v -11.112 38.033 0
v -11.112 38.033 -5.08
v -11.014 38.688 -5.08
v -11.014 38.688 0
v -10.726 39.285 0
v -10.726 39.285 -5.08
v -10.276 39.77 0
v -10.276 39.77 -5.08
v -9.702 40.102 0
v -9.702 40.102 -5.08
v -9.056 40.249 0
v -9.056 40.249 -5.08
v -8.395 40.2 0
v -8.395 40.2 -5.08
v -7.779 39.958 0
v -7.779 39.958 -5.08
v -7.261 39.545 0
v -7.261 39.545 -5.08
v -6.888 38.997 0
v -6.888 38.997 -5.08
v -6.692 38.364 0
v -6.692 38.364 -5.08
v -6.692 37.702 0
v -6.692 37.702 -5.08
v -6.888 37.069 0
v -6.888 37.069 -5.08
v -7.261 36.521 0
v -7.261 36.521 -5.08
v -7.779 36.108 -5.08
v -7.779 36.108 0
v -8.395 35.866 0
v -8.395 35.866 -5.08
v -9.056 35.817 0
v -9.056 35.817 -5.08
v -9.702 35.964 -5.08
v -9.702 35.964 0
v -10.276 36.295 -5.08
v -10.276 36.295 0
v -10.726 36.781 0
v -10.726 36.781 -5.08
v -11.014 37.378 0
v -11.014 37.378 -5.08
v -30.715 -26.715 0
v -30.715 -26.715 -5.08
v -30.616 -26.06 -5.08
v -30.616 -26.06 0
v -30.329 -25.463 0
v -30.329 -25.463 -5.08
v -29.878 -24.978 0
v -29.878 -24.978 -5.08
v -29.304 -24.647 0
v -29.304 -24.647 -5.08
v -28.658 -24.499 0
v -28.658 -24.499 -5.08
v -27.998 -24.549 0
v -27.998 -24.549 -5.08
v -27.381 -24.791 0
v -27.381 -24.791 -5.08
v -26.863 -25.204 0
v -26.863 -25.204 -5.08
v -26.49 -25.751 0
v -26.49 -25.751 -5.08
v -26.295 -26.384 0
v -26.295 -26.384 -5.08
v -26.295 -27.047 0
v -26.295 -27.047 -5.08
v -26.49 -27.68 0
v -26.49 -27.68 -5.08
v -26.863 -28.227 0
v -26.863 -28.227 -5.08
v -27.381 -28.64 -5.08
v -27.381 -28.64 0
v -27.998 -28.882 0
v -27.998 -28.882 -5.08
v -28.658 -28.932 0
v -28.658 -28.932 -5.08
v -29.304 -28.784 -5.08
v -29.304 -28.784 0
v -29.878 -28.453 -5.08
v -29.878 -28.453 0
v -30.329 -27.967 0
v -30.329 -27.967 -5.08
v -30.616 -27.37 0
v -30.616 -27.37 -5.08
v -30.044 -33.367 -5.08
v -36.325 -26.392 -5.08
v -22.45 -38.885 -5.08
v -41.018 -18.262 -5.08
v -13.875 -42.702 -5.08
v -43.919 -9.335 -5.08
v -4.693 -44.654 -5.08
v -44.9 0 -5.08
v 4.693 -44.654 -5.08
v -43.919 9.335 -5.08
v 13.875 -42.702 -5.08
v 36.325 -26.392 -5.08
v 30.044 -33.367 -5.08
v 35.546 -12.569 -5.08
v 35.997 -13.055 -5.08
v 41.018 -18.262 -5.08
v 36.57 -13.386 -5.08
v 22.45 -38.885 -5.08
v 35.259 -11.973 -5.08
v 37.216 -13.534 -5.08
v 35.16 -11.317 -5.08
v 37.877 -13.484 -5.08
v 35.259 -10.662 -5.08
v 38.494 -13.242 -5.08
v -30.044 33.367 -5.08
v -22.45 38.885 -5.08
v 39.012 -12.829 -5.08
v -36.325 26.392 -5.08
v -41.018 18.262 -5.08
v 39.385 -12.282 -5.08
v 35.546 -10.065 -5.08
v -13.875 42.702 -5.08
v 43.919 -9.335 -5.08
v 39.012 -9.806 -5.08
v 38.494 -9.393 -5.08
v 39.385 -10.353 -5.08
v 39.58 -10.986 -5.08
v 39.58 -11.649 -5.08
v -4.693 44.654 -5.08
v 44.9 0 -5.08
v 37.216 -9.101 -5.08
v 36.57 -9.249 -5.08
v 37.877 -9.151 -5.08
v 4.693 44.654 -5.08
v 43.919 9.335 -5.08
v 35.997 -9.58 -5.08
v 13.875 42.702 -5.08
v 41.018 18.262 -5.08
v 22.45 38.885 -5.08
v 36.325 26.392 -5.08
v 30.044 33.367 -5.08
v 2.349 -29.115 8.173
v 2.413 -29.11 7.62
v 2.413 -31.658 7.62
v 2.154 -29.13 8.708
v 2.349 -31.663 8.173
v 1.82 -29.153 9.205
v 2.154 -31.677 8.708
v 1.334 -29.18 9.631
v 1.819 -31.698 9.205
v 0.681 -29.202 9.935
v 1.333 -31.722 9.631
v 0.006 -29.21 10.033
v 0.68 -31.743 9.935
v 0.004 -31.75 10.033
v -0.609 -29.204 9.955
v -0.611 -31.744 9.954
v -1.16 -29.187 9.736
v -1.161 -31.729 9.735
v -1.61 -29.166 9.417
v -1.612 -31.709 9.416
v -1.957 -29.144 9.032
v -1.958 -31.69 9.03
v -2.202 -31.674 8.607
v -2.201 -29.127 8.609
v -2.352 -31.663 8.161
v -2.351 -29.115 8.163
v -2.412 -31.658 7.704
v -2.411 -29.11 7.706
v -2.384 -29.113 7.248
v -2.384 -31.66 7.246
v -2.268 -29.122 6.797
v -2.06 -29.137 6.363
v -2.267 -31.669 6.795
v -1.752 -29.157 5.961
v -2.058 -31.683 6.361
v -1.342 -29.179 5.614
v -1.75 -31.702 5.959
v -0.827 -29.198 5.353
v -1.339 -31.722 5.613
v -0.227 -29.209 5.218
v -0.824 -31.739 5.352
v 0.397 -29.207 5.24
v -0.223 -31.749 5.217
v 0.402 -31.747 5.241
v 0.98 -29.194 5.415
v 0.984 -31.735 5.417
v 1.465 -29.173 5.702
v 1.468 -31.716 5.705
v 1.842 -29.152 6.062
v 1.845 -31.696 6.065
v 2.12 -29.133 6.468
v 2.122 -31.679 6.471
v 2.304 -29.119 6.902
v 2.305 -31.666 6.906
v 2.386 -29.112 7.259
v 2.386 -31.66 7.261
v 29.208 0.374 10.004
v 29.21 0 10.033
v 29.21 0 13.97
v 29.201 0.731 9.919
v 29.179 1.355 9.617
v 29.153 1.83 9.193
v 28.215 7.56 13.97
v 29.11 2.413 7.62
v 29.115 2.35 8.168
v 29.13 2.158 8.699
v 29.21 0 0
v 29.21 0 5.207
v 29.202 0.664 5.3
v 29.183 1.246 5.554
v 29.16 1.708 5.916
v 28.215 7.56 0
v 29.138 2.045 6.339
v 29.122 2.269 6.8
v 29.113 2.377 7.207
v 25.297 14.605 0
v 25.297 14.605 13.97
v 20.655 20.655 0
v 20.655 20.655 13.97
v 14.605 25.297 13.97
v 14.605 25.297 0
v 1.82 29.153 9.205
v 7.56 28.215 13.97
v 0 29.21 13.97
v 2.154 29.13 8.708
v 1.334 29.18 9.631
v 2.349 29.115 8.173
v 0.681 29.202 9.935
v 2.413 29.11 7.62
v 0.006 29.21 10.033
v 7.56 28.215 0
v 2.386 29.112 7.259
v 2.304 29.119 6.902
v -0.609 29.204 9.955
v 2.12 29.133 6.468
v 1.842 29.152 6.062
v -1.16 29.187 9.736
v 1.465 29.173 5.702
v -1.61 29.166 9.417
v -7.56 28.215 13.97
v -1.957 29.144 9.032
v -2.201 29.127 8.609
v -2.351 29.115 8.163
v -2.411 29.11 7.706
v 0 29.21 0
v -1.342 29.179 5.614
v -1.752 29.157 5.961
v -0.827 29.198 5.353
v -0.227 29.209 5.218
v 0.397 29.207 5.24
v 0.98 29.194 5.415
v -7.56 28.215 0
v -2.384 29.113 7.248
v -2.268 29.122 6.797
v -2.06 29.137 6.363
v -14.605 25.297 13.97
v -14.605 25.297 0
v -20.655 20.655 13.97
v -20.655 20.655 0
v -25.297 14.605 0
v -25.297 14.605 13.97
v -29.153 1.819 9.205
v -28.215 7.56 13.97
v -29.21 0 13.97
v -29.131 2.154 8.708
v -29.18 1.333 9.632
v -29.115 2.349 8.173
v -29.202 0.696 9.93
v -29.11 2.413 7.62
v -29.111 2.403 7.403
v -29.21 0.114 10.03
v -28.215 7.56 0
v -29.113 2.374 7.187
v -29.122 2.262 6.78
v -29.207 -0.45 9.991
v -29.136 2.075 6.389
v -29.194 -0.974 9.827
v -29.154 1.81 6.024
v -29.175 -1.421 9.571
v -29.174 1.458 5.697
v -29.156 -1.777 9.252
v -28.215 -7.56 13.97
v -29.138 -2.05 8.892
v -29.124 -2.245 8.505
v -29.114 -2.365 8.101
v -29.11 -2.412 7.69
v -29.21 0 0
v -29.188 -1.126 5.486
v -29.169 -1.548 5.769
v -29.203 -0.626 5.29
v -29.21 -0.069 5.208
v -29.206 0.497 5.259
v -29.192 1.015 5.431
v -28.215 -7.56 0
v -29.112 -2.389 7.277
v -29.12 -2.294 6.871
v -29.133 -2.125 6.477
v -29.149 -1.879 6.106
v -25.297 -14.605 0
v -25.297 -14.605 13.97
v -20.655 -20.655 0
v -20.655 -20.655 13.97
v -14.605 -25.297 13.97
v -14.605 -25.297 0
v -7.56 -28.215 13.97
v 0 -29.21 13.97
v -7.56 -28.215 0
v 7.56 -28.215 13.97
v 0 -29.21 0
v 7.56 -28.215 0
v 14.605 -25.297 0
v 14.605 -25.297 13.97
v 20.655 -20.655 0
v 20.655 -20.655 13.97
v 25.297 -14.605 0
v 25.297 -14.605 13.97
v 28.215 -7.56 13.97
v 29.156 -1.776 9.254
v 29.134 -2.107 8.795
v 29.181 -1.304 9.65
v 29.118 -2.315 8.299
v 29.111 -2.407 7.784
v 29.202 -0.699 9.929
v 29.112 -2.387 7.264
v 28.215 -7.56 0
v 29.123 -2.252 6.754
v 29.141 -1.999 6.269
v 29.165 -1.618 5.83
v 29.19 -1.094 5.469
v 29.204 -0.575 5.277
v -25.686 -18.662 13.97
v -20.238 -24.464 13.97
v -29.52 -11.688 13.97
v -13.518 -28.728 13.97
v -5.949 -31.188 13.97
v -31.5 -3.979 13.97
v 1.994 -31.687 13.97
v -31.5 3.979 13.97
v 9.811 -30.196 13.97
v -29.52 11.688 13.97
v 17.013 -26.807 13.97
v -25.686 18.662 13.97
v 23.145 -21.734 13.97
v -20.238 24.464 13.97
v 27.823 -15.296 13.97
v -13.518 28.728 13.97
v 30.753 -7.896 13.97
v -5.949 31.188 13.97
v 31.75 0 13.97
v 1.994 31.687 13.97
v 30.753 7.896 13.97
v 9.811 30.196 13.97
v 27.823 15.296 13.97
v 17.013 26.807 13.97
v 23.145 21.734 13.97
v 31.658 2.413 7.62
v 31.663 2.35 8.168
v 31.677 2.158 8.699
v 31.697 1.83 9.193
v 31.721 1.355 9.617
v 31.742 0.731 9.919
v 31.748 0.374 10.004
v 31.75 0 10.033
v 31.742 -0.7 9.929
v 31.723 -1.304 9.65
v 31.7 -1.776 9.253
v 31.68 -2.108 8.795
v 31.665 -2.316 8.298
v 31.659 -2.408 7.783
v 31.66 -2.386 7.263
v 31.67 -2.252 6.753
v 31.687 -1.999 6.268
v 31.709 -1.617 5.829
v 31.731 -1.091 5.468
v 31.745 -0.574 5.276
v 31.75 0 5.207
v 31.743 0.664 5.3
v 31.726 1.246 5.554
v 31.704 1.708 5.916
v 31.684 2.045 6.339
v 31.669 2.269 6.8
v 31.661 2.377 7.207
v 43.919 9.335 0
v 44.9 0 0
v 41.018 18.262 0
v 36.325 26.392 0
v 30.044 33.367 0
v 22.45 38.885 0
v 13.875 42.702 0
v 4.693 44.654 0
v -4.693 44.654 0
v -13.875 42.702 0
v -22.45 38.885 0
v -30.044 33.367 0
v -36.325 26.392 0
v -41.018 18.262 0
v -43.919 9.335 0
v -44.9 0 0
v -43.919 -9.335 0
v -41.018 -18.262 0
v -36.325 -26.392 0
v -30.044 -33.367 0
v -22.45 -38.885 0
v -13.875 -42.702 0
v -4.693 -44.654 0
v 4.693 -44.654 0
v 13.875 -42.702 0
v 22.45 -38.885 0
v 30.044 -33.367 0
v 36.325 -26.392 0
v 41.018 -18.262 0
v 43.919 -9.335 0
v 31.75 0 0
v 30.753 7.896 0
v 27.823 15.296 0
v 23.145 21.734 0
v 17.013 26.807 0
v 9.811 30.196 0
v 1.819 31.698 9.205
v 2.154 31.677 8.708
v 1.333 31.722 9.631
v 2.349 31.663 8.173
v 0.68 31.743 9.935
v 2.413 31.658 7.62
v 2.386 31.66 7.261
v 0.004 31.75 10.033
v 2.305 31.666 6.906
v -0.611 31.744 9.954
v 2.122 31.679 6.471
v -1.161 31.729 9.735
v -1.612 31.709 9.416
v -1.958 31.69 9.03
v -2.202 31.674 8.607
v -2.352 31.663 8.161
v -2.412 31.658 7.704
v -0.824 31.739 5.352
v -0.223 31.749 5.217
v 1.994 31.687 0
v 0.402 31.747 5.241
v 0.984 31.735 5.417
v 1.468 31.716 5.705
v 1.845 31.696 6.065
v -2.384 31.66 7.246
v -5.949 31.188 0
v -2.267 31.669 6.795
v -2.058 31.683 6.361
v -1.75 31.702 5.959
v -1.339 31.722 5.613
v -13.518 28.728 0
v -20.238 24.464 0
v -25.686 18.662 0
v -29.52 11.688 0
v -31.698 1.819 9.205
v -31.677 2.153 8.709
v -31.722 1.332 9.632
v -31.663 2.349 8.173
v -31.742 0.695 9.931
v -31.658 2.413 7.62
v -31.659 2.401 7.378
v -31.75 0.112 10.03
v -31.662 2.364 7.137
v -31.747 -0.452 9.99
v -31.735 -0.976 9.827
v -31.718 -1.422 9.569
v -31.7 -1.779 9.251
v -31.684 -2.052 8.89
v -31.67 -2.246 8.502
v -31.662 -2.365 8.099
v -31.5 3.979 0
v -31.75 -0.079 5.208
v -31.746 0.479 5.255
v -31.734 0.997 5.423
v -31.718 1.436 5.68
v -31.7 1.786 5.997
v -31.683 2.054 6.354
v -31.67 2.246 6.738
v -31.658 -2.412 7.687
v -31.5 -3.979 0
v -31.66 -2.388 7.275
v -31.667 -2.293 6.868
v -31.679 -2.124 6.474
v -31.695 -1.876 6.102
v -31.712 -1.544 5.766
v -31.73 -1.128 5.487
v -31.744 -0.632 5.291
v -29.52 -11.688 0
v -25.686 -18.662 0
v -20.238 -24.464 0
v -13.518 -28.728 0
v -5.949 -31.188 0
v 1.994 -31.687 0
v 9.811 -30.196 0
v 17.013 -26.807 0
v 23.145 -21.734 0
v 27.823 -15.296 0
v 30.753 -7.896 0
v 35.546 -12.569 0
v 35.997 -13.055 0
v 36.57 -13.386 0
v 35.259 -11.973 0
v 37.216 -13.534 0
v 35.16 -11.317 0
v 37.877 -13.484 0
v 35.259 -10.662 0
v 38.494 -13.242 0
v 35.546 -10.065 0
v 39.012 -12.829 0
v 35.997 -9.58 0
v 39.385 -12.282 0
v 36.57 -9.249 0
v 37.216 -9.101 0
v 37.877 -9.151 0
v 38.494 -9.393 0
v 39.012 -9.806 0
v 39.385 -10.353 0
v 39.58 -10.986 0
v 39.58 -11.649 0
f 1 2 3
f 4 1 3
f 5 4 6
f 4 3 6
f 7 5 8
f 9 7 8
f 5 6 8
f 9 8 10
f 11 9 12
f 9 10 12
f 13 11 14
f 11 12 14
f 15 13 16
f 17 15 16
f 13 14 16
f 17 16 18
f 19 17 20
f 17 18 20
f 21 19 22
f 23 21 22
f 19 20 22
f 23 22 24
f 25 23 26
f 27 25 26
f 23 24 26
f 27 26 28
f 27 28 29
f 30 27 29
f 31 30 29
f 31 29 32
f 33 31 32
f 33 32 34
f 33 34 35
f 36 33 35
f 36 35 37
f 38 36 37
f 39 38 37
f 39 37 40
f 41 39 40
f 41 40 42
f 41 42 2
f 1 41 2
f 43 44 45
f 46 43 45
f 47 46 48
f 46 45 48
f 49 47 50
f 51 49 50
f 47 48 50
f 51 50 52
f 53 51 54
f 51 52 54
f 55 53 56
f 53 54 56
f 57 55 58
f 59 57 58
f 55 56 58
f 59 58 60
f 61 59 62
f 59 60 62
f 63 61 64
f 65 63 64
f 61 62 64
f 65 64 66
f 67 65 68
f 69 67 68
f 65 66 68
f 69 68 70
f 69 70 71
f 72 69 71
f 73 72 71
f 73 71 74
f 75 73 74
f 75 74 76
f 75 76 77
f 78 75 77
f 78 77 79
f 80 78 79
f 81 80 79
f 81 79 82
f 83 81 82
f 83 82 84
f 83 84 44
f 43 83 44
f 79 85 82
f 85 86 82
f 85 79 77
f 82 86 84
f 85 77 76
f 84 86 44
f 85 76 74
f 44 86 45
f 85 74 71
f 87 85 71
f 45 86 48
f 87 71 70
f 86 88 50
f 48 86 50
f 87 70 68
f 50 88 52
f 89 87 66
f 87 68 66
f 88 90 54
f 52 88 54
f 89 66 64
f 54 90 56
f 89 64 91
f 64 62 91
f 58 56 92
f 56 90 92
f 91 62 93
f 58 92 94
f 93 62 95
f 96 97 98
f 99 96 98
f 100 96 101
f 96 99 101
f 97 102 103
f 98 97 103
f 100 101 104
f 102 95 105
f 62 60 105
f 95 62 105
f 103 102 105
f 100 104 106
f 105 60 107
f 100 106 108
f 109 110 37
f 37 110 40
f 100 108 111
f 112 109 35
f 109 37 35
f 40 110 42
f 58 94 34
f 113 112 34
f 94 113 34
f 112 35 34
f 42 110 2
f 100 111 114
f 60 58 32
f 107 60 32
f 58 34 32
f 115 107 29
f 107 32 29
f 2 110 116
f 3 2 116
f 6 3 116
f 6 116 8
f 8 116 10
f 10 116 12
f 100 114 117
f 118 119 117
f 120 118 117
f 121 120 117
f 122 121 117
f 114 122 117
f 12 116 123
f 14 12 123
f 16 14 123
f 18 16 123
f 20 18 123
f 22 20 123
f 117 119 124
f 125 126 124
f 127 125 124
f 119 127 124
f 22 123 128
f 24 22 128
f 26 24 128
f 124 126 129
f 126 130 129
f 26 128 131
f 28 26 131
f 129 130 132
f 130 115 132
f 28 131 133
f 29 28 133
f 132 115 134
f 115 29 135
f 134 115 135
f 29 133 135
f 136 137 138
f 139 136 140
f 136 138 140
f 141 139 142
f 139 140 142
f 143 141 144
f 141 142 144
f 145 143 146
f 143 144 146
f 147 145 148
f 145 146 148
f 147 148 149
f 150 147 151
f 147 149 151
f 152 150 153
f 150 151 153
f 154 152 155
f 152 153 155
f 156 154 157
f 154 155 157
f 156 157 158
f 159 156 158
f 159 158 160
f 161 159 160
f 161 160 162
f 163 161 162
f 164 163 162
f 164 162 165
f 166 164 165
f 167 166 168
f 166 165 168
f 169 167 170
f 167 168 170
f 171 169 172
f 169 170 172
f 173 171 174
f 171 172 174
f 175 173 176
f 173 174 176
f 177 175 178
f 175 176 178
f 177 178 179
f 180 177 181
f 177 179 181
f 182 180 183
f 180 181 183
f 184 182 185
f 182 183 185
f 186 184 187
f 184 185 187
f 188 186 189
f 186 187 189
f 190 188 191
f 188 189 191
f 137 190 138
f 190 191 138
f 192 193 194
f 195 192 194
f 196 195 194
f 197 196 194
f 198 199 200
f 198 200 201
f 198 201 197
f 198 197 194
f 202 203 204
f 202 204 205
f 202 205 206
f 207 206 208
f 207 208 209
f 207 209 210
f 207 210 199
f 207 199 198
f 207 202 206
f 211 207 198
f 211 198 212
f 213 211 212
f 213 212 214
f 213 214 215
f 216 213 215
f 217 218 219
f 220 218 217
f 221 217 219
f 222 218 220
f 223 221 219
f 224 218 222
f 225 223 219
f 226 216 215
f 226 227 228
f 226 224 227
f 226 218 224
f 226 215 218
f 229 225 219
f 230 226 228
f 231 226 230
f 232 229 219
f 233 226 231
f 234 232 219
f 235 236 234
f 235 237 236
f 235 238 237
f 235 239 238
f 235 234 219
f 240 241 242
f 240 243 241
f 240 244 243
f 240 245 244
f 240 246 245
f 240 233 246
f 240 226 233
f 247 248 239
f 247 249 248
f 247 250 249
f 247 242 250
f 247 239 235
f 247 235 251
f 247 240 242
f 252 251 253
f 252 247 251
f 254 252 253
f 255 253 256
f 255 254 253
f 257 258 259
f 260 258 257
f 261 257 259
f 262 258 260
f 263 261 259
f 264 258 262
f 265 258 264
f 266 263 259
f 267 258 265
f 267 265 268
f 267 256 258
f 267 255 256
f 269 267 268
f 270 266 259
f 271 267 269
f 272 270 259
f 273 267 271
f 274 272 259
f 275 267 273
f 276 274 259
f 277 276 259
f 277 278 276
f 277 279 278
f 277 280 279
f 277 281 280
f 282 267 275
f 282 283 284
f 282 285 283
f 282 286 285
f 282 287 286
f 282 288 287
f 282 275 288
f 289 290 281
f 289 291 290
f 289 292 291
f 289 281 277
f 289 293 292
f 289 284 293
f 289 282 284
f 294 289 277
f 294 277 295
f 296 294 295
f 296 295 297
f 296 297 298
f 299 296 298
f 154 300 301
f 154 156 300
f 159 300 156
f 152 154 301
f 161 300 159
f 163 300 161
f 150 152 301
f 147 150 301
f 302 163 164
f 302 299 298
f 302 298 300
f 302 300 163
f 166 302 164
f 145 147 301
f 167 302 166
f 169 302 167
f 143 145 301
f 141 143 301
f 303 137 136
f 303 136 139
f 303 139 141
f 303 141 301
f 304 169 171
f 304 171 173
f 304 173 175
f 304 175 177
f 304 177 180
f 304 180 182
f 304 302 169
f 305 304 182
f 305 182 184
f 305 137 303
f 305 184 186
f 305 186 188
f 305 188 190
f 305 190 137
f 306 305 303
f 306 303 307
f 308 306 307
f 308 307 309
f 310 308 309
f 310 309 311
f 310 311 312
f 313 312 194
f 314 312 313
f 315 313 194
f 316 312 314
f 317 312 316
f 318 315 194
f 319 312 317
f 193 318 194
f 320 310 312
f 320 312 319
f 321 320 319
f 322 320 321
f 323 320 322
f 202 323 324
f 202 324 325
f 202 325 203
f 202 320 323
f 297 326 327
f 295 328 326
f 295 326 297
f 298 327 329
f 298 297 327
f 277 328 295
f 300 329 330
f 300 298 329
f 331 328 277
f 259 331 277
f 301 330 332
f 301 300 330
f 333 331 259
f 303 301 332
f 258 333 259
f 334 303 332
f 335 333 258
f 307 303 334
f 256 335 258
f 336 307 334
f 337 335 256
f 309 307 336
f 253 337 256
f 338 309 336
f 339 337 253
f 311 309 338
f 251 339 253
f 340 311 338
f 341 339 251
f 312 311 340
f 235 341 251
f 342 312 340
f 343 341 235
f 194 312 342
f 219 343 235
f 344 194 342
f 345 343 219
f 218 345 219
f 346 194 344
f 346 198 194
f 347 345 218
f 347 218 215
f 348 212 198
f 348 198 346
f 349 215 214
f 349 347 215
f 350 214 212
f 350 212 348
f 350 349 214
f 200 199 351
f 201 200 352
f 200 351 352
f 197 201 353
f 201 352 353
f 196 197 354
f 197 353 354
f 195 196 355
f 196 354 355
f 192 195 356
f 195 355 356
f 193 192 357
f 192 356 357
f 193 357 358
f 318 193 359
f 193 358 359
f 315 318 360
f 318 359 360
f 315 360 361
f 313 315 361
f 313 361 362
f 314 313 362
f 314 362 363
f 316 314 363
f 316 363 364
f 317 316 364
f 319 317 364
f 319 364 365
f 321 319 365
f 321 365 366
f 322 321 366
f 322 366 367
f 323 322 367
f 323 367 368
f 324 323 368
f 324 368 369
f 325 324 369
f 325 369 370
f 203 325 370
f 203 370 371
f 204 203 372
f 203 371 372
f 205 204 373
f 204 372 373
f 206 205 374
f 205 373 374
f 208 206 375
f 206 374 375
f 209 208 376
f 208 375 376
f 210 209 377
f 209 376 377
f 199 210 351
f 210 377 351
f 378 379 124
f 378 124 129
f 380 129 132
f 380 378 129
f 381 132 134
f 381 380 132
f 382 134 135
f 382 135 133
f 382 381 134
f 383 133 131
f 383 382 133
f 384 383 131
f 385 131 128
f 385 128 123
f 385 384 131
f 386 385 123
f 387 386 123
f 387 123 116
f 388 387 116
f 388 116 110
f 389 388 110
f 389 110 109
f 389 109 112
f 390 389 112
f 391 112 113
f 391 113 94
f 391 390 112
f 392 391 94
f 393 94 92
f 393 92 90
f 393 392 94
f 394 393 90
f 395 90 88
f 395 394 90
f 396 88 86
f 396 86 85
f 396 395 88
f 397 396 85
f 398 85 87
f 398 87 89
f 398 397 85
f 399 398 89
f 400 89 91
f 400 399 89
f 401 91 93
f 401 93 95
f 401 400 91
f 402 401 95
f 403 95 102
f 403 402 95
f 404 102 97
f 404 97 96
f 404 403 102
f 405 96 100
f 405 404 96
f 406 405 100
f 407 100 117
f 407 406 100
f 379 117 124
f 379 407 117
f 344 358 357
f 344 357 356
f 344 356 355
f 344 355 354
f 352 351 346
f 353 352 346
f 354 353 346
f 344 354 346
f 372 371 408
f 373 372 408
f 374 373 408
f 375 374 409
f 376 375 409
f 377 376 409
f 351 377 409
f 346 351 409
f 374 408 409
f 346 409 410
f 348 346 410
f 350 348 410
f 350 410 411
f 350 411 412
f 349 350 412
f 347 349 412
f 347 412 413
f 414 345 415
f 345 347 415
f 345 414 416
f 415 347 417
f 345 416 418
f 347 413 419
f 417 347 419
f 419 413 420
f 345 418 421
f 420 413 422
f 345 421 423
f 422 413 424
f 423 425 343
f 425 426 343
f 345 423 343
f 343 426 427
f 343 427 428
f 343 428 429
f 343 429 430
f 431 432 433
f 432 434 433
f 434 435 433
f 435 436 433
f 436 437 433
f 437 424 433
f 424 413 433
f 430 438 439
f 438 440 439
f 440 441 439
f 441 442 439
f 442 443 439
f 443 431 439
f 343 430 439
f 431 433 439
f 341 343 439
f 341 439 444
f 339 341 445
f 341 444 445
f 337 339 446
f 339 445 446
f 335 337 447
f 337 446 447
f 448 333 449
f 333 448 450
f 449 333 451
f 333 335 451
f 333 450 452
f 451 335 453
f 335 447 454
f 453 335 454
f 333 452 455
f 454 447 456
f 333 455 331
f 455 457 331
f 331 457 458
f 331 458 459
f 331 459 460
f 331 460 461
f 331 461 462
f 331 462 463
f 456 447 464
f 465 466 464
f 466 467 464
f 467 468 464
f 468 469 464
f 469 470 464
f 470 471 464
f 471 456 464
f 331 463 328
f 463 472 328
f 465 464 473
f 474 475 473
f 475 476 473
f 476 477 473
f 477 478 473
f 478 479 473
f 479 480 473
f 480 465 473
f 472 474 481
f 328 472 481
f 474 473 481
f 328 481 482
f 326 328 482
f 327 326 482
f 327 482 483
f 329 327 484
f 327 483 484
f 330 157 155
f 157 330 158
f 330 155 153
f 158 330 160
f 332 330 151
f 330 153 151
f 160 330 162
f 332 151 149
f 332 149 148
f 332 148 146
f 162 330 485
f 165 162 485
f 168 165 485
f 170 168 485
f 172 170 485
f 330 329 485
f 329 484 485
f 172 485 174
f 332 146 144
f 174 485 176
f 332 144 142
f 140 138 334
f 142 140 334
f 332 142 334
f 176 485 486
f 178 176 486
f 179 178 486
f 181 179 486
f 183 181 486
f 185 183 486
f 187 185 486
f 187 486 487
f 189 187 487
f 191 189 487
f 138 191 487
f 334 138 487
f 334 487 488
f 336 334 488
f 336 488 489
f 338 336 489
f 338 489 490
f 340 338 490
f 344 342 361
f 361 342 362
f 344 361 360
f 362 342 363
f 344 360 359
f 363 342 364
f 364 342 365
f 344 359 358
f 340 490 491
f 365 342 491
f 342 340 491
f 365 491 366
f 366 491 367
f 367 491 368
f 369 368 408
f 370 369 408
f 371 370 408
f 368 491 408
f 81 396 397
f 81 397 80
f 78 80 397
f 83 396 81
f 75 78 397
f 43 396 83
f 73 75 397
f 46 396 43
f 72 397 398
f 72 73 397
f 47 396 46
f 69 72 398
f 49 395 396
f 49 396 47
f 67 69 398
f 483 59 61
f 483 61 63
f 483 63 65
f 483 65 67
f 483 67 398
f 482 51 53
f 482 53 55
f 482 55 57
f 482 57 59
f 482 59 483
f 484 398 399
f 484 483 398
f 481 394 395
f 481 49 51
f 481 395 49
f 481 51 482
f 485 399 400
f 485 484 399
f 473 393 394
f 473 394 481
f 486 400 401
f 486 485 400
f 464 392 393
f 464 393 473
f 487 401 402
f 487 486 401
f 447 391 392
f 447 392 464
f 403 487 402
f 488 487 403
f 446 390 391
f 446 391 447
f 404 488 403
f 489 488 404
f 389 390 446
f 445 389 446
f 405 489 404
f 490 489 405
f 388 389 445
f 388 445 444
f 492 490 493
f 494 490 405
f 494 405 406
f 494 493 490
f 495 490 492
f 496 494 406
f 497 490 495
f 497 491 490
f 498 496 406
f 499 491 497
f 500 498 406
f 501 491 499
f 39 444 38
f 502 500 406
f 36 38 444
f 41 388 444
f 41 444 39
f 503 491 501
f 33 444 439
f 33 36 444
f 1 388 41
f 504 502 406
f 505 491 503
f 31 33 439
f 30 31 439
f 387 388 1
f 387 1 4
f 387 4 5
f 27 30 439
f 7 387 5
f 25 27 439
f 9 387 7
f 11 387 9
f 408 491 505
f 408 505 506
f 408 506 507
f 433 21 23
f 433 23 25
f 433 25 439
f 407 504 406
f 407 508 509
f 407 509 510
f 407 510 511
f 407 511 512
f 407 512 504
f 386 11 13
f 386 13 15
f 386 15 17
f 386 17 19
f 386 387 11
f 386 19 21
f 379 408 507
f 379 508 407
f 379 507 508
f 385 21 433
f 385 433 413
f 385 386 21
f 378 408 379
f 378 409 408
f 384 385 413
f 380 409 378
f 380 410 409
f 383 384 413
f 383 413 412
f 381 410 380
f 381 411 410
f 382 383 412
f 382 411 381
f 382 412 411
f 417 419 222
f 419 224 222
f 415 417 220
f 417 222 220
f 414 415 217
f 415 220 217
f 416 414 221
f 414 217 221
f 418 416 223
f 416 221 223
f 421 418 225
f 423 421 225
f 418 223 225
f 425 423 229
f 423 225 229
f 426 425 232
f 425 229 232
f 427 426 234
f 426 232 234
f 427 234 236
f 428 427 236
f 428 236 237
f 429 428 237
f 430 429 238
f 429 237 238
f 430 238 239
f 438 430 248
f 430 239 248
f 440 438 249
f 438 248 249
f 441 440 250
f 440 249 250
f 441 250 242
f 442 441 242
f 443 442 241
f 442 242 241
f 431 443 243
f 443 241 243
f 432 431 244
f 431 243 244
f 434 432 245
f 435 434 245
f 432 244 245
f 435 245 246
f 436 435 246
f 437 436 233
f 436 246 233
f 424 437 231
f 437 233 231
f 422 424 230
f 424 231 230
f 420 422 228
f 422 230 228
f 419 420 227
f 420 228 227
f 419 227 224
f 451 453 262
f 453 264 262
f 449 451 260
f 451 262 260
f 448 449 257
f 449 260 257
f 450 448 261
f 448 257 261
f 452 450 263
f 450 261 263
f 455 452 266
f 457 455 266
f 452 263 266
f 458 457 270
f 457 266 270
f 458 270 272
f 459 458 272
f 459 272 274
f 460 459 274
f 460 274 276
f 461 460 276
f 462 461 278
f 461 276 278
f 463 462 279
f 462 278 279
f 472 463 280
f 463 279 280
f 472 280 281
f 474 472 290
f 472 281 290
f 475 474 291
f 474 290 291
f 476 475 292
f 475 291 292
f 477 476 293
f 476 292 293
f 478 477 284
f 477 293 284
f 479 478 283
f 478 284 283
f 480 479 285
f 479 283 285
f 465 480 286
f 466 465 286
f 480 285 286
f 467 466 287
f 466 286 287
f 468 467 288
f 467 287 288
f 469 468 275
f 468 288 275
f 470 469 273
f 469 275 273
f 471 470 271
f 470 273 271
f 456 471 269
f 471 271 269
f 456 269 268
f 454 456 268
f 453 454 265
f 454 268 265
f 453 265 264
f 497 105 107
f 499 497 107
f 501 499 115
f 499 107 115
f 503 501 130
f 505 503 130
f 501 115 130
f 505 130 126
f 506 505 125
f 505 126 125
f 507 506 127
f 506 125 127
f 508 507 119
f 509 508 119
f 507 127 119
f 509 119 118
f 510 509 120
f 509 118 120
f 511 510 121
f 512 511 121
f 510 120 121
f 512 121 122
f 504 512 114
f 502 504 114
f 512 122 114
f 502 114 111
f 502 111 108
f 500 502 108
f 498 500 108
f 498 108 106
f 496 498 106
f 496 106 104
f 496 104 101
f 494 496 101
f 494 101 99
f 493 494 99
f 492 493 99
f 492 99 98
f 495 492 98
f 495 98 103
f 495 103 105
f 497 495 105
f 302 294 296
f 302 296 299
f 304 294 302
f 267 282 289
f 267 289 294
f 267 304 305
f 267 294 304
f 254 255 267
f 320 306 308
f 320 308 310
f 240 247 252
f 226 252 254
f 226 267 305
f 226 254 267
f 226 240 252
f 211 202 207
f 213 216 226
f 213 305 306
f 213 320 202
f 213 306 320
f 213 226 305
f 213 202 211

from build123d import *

# Parameters (mm, degrees)
F0_R      = 31.75
F0_R_2    = 29.21
F1_DEPTH  = 13.97
F4_R      = 44.9
F5_DEPTH  = 5.08
F6_R      = 2.413
F7_DEPTH  = 38.1
F9_D      = 4.445
F9_DEPTH  = 12.7
F10_R     = 2.413
F11_DEPTH = 50.8


with BuildPart() as f1:
    # F0 (on Top) → F1 (new body)
    with BuildSketch(Plane.XY):
        Circle(F0_R)
        Circle(F0_R_2, mode=Mode.SUBTRACT)
    extrude(amount=F1_DEPTH)

    # F4 (on Top) → F5 (join)
    with BuildSketch(Plane.XY):
        Circle(F4_R)
    extrude(amount=-F5_DEPTH)

    # F6 (on Front) → F7 (cut, symmetric)
    with BuildSketch(Plane.XZ):
        with Locations((0, 7.62)):
            Circle(F6_R)
    extrude(amount=F7_DEPTH, both=True, mode=Mode.SUBTRACT)

    # F9
    with Locations(Plane.XY):
        with Locations((-8.89, 38.032818), (-28.492387, -26.715375), (37.382387, -11.317443)):
            Hole(F9_D / 2, depth=F9_DEPTH)

    # F10 (on Right) → F11 (cut, symmetric)
    with BuildSketch(Plane.YZ):
        with Locations((0, 7.62)):
            Circle(F10_R)
    extrude(amount=F11_DEPTH, both=True, mode=Mode.SUBTRACT)


solid = f1.part
